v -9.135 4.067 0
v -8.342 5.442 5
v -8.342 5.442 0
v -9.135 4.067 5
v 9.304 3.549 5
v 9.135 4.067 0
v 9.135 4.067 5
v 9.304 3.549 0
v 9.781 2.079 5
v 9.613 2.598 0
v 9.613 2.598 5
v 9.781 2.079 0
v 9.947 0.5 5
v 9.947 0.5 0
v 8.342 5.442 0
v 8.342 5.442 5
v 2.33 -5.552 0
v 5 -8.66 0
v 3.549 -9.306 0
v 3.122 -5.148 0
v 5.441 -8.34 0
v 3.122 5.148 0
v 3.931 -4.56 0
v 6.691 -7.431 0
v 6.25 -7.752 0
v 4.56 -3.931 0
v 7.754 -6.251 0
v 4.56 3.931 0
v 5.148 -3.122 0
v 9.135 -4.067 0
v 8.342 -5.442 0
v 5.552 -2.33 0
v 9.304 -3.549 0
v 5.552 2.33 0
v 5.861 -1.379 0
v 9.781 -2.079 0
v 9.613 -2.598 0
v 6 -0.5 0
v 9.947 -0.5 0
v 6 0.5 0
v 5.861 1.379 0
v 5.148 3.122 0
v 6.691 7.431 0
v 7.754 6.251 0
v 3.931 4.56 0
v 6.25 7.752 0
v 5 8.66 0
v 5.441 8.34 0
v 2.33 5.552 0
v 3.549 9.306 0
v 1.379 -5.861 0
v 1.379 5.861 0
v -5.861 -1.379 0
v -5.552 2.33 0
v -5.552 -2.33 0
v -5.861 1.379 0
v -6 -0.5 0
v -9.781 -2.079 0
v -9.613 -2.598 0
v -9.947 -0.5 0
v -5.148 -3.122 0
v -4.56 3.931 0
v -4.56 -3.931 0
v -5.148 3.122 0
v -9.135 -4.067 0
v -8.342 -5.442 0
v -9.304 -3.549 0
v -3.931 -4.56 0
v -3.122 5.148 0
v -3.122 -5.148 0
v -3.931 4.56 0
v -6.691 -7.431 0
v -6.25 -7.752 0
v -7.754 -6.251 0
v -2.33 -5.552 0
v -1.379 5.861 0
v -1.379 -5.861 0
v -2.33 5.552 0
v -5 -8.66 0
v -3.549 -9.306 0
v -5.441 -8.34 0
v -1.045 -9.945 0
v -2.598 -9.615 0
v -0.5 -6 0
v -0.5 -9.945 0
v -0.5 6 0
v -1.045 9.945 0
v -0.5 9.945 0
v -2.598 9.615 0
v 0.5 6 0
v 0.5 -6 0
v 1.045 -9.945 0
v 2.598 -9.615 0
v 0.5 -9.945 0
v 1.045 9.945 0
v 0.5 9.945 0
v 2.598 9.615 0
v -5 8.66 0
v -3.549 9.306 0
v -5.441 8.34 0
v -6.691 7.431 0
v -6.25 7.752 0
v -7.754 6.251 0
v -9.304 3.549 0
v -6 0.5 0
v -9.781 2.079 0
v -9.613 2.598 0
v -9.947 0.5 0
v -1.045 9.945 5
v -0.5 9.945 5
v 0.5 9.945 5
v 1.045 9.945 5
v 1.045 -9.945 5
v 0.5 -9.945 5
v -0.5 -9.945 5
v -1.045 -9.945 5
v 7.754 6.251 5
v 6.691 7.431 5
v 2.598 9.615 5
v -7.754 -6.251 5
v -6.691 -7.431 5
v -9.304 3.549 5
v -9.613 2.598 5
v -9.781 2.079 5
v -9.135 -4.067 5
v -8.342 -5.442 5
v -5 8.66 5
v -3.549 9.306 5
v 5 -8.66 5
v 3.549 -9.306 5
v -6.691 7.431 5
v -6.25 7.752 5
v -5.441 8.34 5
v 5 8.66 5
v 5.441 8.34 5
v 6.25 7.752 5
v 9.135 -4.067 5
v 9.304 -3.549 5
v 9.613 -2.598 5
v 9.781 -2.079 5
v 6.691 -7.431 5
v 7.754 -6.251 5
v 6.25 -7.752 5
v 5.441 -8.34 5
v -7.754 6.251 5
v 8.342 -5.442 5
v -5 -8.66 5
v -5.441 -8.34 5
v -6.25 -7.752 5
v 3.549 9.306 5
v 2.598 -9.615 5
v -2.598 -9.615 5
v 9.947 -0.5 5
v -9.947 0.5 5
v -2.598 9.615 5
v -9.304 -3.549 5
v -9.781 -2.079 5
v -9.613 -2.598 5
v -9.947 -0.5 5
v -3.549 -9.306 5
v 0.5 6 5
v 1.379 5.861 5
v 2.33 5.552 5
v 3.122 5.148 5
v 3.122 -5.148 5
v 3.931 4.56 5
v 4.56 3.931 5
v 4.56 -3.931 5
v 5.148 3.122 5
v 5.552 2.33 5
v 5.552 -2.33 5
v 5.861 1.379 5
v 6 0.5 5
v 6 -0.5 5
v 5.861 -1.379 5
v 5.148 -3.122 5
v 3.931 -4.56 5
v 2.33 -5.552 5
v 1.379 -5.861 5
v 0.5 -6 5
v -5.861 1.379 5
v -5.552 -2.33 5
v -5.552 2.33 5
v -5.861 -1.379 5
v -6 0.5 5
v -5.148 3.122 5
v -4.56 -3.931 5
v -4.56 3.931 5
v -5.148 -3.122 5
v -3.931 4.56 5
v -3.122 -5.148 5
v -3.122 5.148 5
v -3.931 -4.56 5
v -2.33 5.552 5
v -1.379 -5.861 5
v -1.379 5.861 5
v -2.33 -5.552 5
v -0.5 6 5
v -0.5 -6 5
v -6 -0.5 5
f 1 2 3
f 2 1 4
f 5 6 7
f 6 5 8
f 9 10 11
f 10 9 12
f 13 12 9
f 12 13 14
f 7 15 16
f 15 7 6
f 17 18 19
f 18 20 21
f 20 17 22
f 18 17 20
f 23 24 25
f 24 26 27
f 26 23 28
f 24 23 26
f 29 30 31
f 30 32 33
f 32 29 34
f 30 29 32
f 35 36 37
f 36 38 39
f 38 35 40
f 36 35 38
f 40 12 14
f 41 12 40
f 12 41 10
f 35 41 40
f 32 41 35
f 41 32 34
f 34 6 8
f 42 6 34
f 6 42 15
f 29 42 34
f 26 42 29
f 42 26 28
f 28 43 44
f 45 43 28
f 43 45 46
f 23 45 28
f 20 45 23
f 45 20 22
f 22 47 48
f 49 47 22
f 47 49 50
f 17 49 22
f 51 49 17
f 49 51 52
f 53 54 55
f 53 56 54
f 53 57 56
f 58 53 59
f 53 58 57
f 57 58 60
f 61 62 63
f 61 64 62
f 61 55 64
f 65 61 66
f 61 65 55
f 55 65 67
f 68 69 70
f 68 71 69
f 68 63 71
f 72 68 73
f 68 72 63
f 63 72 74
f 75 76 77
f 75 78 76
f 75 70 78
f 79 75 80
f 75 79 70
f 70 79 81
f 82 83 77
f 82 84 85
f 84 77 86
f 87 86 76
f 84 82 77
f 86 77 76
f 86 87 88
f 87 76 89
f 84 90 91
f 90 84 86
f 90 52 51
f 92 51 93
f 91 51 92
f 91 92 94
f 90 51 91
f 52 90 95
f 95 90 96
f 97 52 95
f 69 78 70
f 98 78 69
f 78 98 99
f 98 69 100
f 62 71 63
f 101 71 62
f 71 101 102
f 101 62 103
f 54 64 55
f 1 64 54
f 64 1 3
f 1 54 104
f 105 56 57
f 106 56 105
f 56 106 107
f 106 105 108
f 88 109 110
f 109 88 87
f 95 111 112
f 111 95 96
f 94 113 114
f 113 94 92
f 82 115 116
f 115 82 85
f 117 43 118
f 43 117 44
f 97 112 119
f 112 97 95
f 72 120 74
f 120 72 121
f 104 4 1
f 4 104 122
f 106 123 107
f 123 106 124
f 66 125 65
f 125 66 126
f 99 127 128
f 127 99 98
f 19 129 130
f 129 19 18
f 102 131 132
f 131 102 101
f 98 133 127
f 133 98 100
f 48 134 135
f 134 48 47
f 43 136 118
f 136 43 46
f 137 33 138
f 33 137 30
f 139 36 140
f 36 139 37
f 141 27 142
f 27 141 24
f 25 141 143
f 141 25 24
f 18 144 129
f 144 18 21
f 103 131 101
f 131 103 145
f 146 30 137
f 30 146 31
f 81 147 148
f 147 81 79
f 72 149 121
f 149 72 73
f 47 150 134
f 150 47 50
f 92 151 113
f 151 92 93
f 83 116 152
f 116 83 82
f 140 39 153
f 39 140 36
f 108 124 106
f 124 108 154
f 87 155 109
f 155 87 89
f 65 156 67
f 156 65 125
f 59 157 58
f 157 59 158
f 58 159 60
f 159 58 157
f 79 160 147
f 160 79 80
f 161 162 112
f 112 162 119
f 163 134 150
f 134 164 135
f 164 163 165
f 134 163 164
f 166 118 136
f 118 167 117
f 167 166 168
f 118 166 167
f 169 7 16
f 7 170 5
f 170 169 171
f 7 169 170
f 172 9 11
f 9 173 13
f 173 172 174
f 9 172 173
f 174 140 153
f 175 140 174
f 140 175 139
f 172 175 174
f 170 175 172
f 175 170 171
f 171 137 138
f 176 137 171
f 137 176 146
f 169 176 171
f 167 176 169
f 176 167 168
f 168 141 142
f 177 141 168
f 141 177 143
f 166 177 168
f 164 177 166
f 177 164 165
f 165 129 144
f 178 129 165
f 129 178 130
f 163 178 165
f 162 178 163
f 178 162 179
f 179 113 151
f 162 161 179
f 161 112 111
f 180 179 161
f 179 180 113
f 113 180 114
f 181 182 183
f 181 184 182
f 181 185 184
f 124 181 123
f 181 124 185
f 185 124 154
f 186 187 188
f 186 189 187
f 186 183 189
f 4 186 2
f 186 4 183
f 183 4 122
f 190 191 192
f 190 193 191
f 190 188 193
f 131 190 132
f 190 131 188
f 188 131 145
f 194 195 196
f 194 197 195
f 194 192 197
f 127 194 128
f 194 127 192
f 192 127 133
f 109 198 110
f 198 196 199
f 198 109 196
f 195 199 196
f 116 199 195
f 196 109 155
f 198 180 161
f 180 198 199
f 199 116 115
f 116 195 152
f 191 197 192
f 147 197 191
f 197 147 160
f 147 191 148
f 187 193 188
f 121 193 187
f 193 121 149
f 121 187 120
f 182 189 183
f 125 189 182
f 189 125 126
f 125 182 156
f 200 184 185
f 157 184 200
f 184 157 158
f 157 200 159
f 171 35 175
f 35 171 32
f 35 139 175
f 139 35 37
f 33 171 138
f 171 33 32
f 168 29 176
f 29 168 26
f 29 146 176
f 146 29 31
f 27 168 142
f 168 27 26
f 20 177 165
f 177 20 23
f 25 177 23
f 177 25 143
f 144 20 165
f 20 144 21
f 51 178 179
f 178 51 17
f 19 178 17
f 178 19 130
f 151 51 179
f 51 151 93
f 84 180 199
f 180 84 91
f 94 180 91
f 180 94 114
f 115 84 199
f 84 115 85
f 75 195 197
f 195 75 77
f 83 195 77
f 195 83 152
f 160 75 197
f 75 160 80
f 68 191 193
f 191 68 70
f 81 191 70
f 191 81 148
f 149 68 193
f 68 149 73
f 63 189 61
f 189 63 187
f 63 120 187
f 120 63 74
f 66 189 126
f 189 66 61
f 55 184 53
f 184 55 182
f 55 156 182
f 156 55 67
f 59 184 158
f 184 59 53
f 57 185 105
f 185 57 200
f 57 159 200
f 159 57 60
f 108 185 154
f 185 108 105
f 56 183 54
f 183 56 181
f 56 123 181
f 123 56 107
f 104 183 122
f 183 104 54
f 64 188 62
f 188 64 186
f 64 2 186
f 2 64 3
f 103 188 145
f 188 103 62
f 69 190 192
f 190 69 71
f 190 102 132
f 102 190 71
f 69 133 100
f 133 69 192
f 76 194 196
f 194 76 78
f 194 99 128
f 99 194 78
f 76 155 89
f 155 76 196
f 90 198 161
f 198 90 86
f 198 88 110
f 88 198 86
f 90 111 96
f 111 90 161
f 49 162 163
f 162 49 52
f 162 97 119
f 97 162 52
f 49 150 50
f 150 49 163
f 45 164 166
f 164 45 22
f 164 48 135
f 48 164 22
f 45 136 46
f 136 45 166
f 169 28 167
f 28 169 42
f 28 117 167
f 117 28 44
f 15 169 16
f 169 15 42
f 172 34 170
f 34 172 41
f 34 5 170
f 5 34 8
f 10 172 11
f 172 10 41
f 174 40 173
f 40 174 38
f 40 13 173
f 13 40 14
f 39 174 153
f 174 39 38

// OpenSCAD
module rot_z_diffs(n, deg) {
    if(n == 0) {
        children(0);
    } else {
        rot_z_diffs(n - 1, deg) {
            difference() {
                rotate([0, 0, deg]) {
                    children(0);
                }
                children(1);
            }
            children(1);
        }
    }
}

module sunburst(radius, height, n_rays, ray_width, ray_depth) {
    rot_z_diffs(n_rays, 360 / n_rays) {
        cylinder(r = radius, h = height);
        translate([radius - ray_depth / 2, 0, height / 2]) {
            cube([ray_depth, ray_width, height + 2], center = true);
        }
    }
}

sunburst(10, 5, 20, 1, 4);
